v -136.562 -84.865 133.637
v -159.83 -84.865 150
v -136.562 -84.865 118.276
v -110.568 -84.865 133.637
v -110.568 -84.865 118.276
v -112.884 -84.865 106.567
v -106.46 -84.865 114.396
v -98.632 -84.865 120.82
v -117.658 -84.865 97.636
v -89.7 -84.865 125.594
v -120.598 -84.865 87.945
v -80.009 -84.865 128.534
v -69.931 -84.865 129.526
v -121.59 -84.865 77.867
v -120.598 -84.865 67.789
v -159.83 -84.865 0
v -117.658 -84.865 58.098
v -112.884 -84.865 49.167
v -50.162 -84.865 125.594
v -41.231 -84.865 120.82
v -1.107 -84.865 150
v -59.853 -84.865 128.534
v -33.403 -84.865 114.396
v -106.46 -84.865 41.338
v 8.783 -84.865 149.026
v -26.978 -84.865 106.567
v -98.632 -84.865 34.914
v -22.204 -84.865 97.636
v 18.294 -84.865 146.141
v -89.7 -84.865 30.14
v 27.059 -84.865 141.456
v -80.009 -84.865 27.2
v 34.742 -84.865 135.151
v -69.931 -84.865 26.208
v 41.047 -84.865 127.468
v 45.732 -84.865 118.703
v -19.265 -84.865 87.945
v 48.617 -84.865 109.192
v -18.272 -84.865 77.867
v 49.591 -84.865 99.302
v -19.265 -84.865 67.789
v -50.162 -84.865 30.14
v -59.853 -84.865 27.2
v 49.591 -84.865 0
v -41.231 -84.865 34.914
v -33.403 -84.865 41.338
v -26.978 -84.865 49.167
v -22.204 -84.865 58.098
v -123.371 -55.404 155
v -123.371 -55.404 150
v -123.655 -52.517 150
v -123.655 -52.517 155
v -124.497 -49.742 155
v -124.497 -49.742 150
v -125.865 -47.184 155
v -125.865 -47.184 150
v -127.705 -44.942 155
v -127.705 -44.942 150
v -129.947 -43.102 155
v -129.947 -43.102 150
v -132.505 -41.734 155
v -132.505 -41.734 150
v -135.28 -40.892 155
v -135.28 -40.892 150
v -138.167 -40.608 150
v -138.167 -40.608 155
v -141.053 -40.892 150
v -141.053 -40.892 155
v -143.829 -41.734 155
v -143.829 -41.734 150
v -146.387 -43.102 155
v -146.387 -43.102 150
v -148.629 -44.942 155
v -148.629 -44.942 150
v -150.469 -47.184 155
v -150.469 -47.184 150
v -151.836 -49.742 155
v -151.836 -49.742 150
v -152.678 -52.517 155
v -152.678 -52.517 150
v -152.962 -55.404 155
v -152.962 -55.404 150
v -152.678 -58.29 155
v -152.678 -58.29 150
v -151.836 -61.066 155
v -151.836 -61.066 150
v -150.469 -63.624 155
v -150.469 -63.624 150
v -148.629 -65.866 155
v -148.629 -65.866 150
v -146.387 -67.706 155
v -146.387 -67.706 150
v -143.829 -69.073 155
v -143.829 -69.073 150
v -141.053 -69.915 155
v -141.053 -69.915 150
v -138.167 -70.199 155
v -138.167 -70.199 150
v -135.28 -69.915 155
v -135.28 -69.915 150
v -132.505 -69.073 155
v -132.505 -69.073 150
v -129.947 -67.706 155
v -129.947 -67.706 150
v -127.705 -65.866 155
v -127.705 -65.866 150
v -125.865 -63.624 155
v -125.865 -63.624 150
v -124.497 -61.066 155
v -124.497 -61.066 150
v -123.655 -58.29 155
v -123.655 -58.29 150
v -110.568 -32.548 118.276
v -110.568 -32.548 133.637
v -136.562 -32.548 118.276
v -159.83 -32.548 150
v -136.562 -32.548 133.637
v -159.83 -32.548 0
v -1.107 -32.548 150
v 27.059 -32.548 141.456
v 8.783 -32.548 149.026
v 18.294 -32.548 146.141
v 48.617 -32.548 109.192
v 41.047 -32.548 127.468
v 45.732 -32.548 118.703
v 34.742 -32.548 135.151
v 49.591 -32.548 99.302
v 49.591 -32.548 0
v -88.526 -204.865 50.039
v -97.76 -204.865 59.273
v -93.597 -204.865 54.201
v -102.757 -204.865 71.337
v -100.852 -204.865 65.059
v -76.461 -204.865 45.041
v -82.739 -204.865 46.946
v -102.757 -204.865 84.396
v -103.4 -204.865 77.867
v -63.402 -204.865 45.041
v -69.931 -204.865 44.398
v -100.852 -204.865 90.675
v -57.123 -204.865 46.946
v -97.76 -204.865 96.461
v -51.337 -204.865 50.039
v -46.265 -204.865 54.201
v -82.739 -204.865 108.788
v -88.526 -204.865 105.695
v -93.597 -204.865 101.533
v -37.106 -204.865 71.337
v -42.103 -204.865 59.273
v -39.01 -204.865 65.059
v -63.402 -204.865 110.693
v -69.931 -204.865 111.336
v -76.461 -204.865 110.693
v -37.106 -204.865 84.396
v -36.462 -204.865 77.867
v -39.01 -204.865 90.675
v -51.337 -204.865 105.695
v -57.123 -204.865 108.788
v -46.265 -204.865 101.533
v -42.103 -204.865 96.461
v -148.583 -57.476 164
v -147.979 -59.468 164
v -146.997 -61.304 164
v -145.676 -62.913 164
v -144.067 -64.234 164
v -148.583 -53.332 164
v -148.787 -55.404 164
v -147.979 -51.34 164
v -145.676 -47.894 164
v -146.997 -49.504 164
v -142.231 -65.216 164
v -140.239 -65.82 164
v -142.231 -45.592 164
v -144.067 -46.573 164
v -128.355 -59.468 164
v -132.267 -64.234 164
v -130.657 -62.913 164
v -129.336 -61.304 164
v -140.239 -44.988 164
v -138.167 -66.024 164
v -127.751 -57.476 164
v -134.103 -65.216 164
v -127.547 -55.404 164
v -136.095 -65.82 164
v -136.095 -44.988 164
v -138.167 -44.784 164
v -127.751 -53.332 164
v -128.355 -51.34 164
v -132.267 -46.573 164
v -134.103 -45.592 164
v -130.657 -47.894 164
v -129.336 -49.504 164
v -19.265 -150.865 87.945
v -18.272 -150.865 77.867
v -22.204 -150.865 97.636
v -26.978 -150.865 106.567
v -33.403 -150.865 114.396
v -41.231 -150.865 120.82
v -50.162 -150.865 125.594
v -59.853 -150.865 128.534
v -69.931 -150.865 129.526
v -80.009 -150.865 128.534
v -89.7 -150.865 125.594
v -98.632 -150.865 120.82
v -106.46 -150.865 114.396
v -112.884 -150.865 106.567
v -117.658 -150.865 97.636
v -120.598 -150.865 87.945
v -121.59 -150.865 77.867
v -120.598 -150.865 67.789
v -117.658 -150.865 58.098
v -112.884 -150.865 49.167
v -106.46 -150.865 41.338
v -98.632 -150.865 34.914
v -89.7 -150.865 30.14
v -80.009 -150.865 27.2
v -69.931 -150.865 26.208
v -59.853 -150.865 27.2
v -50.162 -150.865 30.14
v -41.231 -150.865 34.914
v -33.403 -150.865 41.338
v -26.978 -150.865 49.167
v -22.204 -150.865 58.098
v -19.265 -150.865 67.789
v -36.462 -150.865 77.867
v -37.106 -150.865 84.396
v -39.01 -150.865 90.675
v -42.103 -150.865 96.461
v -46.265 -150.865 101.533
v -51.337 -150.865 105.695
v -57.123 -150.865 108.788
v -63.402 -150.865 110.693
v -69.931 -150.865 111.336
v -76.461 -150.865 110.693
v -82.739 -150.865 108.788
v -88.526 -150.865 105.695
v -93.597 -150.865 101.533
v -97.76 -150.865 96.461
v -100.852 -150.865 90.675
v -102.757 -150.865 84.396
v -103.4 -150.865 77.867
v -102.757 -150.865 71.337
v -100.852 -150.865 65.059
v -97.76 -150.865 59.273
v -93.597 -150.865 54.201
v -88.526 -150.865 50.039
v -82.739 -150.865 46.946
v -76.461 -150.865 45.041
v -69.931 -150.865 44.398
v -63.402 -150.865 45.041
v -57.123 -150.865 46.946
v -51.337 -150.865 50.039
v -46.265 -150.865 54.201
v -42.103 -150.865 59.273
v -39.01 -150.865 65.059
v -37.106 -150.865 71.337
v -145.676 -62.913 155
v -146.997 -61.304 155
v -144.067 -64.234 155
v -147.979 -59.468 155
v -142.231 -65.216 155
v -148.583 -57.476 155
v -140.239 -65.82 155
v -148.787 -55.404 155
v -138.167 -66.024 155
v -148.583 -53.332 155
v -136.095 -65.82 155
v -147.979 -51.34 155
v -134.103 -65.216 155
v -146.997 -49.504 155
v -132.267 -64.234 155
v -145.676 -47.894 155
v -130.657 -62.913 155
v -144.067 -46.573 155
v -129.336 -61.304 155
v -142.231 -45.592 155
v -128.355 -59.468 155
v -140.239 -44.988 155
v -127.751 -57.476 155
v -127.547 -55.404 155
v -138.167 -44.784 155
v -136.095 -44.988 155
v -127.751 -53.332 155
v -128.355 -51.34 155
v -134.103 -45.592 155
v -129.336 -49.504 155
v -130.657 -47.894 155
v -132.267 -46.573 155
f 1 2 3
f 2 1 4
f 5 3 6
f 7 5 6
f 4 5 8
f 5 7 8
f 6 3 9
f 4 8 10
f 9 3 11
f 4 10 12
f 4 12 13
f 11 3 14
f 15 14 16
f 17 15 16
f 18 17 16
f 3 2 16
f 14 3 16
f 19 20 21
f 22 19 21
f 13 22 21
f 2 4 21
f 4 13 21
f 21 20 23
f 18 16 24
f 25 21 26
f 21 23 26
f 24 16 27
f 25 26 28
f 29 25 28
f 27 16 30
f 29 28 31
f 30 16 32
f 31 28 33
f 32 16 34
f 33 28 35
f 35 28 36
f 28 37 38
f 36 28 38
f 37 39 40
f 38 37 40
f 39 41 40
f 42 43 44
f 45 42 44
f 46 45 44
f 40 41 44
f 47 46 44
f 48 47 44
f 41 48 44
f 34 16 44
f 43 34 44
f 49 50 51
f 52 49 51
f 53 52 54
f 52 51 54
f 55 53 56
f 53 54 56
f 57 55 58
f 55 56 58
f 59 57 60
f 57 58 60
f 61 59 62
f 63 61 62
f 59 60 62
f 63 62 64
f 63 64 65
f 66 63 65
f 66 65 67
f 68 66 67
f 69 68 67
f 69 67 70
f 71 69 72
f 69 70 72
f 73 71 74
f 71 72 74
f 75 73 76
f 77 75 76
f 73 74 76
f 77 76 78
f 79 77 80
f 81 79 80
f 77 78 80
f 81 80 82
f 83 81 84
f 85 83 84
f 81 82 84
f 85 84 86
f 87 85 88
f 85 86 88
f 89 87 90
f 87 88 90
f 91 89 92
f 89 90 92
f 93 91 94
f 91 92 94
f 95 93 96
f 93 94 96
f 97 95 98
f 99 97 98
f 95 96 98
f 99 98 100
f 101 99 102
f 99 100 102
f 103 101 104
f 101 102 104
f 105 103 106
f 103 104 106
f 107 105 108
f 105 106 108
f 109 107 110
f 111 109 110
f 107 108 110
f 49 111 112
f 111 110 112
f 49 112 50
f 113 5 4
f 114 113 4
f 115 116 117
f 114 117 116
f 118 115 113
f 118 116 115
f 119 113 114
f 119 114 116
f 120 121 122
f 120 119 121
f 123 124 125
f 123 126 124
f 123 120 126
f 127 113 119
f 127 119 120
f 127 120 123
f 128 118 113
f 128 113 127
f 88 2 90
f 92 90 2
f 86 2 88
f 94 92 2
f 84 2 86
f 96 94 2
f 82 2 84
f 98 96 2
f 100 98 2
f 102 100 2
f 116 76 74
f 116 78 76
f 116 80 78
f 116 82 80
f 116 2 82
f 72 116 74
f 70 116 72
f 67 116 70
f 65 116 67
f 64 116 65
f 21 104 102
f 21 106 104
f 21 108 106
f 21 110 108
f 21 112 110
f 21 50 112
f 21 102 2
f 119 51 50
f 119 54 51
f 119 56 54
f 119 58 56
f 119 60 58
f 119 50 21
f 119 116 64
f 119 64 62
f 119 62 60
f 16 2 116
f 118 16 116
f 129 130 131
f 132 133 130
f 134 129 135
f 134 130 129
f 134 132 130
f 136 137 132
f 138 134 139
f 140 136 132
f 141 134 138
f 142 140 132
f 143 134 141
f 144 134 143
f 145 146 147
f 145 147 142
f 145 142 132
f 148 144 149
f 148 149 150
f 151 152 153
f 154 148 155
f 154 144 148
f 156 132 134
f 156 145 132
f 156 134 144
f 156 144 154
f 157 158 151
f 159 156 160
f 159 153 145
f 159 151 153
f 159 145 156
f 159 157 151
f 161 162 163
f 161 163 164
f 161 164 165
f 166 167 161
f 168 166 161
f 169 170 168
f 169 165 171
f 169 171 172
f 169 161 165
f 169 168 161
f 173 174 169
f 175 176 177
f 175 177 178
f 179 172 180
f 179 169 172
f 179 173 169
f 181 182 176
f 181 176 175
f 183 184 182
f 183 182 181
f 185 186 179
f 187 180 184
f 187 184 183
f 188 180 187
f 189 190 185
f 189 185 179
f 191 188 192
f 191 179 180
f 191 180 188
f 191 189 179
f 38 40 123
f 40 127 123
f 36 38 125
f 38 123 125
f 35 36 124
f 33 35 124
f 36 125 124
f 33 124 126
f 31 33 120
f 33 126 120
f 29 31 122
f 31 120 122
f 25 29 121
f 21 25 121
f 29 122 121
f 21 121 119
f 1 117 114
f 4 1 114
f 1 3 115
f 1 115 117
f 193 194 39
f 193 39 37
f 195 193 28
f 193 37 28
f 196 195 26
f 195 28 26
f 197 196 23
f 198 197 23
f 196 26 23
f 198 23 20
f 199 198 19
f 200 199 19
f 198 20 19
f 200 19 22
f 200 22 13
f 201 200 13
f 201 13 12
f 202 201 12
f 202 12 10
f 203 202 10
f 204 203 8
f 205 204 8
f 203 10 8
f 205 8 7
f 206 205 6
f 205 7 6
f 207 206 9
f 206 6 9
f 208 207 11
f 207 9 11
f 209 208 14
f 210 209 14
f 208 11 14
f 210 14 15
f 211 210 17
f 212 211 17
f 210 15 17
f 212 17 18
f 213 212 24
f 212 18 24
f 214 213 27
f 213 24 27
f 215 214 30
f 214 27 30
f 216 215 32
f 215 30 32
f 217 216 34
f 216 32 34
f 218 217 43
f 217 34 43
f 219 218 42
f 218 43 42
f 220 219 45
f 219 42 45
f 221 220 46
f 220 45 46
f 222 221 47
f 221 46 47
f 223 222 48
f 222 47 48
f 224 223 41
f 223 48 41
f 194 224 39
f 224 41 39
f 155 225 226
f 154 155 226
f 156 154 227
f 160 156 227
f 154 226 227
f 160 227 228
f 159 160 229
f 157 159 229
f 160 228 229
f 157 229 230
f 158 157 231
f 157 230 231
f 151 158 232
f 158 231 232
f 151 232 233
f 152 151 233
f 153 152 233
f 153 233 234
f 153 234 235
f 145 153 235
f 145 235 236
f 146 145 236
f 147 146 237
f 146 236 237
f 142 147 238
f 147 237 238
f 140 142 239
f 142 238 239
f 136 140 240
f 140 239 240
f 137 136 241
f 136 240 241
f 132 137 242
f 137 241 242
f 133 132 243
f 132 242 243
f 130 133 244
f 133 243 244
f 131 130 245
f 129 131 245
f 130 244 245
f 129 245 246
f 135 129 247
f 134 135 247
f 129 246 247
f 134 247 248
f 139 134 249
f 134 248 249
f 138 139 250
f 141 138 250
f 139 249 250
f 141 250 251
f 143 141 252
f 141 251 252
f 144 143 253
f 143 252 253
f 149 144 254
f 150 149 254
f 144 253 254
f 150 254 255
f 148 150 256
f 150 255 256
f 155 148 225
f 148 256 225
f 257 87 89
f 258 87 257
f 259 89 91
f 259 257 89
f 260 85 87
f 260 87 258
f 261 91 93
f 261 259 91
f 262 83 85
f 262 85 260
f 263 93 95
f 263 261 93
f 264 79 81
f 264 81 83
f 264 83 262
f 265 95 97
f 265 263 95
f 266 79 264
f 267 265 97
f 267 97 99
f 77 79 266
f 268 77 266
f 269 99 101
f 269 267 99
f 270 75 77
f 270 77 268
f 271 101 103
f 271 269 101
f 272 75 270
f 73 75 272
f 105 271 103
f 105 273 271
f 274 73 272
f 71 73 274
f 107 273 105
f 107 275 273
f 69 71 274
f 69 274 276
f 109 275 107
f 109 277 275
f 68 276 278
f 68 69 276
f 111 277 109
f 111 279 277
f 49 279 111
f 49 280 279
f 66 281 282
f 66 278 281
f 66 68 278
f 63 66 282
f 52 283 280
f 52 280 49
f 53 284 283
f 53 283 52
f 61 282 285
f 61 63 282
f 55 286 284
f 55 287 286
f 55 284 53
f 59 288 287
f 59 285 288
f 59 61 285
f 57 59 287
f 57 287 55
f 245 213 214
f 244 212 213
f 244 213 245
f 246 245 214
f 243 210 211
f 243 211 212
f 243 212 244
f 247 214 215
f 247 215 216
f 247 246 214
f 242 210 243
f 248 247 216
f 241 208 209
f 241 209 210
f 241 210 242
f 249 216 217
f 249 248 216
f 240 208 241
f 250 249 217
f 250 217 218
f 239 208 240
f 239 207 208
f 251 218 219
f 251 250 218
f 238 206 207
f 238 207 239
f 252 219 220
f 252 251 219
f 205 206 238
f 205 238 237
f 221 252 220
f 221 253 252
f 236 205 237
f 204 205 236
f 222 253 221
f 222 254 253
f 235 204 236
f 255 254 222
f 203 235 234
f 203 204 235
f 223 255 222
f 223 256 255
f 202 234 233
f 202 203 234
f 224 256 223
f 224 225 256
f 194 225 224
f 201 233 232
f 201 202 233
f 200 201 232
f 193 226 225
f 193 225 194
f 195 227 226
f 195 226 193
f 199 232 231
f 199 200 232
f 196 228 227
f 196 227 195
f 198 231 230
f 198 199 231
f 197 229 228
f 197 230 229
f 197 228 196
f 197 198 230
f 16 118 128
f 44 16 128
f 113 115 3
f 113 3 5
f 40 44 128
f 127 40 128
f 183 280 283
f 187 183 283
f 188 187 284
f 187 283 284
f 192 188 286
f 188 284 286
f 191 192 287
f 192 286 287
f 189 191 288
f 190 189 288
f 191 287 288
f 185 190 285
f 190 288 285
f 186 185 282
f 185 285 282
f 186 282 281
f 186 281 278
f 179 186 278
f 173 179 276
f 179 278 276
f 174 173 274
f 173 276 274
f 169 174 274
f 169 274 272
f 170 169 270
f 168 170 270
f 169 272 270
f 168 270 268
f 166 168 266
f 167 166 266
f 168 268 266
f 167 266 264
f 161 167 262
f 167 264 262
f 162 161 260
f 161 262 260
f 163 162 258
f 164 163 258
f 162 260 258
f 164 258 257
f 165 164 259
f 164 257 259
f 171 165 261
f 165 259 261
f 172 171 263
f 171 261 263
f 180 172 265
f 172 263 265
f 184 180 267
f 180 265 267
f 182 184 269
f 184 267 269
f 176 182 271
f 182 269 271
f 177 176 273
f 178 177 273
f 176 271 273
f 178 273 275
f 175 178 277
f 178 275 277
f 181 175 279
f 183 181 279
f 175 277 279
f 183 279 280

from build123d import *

# Parameters (mm, degrees)
F0_W      = 209.42099
F0_H      = 52.317056
F1_DEPTH  = 150
F2_R      = 50.698485
F3_R      = 51.659231
F4_DEPTH  = 66
F5_R      = 33.468817
F6_DEPTH  = 54
F7_R      = 14.795614
F8_DEPTH  = 5
F9_R      = 10.620202
F10_DEPTH = 9
F11_W     = 34.047097
F11_H     = 17.011657
F12_DEPTH = 43
F13_W     = 25.994077
F13_H     = 15.360802
F14_DEPTH = 77


with BuildPart() as f1:
    # F0 (on Top) → F1 (new body)
    with BuildSketch(Plane.XY):
        with Locations((-55.119449, -58.706915)):
            Rectangle(F0_W, F0_H)
    extrude(amount=F1_DEPTH)

    # F2
    f2_edges = [f1.edges().sort_by_distance(p)[0] for p in [
        (49.591046, -58.706915, 150),
    ]]
    fillet(f2_edges, radius=F2_R)

    # F3 (on face) → F4 (join)
    with BuildSketch(Plane.XZ.offset(84.865443)):
        with Locations((-69.931231, 77.866942)):
            Circle(F3_R)
    extrude(amount=F4_DEPTH)

    # F5 (on face) → F6 (join)
    with BuildSketch(Plane.XZ.offset(150.865443)):
        with Locations((-69.931231, 77.866942)):
            Circle(F5_R)
    extrude(amount=F6_DEPTH)

    # F7 (on face) → F8 (join)
    with BuildSketch(Plane.XY.offset(150)):
        with Locations((-138.16677, -55.403817)):
            Circle(F7_R)
    extrude(amount=F8_DEPTH)

    # F9 (on face) → F10 (join)
    with BuildSketch(Plane.XY.offset(155)):
        with Locations((-138.16677, -55.403817)):
            Circle(F9_R)
    extrude(amount=F10_DEPTH)

    # F11 (on face) → F12 (join)
    with BuildSketch(Plane.XZ.offset(84.865443)):
        with Locations((-135.340422, 126.199729)):
            Rectangle(F11_W, F11_H)
    extrude(amount=-F12_DEPTH)

    # F13 (on face) → F14 (cut)
    with BuildSketch(Plane.XZ.offset(84.865443)):
        with Locations((-123.564697, 125.956863)):
            Rectangle(F13_W, F13_H)
    extrude(amount=-F14_DEPTH, mode=Mode.SUBTRACT)


solid = f1.part
